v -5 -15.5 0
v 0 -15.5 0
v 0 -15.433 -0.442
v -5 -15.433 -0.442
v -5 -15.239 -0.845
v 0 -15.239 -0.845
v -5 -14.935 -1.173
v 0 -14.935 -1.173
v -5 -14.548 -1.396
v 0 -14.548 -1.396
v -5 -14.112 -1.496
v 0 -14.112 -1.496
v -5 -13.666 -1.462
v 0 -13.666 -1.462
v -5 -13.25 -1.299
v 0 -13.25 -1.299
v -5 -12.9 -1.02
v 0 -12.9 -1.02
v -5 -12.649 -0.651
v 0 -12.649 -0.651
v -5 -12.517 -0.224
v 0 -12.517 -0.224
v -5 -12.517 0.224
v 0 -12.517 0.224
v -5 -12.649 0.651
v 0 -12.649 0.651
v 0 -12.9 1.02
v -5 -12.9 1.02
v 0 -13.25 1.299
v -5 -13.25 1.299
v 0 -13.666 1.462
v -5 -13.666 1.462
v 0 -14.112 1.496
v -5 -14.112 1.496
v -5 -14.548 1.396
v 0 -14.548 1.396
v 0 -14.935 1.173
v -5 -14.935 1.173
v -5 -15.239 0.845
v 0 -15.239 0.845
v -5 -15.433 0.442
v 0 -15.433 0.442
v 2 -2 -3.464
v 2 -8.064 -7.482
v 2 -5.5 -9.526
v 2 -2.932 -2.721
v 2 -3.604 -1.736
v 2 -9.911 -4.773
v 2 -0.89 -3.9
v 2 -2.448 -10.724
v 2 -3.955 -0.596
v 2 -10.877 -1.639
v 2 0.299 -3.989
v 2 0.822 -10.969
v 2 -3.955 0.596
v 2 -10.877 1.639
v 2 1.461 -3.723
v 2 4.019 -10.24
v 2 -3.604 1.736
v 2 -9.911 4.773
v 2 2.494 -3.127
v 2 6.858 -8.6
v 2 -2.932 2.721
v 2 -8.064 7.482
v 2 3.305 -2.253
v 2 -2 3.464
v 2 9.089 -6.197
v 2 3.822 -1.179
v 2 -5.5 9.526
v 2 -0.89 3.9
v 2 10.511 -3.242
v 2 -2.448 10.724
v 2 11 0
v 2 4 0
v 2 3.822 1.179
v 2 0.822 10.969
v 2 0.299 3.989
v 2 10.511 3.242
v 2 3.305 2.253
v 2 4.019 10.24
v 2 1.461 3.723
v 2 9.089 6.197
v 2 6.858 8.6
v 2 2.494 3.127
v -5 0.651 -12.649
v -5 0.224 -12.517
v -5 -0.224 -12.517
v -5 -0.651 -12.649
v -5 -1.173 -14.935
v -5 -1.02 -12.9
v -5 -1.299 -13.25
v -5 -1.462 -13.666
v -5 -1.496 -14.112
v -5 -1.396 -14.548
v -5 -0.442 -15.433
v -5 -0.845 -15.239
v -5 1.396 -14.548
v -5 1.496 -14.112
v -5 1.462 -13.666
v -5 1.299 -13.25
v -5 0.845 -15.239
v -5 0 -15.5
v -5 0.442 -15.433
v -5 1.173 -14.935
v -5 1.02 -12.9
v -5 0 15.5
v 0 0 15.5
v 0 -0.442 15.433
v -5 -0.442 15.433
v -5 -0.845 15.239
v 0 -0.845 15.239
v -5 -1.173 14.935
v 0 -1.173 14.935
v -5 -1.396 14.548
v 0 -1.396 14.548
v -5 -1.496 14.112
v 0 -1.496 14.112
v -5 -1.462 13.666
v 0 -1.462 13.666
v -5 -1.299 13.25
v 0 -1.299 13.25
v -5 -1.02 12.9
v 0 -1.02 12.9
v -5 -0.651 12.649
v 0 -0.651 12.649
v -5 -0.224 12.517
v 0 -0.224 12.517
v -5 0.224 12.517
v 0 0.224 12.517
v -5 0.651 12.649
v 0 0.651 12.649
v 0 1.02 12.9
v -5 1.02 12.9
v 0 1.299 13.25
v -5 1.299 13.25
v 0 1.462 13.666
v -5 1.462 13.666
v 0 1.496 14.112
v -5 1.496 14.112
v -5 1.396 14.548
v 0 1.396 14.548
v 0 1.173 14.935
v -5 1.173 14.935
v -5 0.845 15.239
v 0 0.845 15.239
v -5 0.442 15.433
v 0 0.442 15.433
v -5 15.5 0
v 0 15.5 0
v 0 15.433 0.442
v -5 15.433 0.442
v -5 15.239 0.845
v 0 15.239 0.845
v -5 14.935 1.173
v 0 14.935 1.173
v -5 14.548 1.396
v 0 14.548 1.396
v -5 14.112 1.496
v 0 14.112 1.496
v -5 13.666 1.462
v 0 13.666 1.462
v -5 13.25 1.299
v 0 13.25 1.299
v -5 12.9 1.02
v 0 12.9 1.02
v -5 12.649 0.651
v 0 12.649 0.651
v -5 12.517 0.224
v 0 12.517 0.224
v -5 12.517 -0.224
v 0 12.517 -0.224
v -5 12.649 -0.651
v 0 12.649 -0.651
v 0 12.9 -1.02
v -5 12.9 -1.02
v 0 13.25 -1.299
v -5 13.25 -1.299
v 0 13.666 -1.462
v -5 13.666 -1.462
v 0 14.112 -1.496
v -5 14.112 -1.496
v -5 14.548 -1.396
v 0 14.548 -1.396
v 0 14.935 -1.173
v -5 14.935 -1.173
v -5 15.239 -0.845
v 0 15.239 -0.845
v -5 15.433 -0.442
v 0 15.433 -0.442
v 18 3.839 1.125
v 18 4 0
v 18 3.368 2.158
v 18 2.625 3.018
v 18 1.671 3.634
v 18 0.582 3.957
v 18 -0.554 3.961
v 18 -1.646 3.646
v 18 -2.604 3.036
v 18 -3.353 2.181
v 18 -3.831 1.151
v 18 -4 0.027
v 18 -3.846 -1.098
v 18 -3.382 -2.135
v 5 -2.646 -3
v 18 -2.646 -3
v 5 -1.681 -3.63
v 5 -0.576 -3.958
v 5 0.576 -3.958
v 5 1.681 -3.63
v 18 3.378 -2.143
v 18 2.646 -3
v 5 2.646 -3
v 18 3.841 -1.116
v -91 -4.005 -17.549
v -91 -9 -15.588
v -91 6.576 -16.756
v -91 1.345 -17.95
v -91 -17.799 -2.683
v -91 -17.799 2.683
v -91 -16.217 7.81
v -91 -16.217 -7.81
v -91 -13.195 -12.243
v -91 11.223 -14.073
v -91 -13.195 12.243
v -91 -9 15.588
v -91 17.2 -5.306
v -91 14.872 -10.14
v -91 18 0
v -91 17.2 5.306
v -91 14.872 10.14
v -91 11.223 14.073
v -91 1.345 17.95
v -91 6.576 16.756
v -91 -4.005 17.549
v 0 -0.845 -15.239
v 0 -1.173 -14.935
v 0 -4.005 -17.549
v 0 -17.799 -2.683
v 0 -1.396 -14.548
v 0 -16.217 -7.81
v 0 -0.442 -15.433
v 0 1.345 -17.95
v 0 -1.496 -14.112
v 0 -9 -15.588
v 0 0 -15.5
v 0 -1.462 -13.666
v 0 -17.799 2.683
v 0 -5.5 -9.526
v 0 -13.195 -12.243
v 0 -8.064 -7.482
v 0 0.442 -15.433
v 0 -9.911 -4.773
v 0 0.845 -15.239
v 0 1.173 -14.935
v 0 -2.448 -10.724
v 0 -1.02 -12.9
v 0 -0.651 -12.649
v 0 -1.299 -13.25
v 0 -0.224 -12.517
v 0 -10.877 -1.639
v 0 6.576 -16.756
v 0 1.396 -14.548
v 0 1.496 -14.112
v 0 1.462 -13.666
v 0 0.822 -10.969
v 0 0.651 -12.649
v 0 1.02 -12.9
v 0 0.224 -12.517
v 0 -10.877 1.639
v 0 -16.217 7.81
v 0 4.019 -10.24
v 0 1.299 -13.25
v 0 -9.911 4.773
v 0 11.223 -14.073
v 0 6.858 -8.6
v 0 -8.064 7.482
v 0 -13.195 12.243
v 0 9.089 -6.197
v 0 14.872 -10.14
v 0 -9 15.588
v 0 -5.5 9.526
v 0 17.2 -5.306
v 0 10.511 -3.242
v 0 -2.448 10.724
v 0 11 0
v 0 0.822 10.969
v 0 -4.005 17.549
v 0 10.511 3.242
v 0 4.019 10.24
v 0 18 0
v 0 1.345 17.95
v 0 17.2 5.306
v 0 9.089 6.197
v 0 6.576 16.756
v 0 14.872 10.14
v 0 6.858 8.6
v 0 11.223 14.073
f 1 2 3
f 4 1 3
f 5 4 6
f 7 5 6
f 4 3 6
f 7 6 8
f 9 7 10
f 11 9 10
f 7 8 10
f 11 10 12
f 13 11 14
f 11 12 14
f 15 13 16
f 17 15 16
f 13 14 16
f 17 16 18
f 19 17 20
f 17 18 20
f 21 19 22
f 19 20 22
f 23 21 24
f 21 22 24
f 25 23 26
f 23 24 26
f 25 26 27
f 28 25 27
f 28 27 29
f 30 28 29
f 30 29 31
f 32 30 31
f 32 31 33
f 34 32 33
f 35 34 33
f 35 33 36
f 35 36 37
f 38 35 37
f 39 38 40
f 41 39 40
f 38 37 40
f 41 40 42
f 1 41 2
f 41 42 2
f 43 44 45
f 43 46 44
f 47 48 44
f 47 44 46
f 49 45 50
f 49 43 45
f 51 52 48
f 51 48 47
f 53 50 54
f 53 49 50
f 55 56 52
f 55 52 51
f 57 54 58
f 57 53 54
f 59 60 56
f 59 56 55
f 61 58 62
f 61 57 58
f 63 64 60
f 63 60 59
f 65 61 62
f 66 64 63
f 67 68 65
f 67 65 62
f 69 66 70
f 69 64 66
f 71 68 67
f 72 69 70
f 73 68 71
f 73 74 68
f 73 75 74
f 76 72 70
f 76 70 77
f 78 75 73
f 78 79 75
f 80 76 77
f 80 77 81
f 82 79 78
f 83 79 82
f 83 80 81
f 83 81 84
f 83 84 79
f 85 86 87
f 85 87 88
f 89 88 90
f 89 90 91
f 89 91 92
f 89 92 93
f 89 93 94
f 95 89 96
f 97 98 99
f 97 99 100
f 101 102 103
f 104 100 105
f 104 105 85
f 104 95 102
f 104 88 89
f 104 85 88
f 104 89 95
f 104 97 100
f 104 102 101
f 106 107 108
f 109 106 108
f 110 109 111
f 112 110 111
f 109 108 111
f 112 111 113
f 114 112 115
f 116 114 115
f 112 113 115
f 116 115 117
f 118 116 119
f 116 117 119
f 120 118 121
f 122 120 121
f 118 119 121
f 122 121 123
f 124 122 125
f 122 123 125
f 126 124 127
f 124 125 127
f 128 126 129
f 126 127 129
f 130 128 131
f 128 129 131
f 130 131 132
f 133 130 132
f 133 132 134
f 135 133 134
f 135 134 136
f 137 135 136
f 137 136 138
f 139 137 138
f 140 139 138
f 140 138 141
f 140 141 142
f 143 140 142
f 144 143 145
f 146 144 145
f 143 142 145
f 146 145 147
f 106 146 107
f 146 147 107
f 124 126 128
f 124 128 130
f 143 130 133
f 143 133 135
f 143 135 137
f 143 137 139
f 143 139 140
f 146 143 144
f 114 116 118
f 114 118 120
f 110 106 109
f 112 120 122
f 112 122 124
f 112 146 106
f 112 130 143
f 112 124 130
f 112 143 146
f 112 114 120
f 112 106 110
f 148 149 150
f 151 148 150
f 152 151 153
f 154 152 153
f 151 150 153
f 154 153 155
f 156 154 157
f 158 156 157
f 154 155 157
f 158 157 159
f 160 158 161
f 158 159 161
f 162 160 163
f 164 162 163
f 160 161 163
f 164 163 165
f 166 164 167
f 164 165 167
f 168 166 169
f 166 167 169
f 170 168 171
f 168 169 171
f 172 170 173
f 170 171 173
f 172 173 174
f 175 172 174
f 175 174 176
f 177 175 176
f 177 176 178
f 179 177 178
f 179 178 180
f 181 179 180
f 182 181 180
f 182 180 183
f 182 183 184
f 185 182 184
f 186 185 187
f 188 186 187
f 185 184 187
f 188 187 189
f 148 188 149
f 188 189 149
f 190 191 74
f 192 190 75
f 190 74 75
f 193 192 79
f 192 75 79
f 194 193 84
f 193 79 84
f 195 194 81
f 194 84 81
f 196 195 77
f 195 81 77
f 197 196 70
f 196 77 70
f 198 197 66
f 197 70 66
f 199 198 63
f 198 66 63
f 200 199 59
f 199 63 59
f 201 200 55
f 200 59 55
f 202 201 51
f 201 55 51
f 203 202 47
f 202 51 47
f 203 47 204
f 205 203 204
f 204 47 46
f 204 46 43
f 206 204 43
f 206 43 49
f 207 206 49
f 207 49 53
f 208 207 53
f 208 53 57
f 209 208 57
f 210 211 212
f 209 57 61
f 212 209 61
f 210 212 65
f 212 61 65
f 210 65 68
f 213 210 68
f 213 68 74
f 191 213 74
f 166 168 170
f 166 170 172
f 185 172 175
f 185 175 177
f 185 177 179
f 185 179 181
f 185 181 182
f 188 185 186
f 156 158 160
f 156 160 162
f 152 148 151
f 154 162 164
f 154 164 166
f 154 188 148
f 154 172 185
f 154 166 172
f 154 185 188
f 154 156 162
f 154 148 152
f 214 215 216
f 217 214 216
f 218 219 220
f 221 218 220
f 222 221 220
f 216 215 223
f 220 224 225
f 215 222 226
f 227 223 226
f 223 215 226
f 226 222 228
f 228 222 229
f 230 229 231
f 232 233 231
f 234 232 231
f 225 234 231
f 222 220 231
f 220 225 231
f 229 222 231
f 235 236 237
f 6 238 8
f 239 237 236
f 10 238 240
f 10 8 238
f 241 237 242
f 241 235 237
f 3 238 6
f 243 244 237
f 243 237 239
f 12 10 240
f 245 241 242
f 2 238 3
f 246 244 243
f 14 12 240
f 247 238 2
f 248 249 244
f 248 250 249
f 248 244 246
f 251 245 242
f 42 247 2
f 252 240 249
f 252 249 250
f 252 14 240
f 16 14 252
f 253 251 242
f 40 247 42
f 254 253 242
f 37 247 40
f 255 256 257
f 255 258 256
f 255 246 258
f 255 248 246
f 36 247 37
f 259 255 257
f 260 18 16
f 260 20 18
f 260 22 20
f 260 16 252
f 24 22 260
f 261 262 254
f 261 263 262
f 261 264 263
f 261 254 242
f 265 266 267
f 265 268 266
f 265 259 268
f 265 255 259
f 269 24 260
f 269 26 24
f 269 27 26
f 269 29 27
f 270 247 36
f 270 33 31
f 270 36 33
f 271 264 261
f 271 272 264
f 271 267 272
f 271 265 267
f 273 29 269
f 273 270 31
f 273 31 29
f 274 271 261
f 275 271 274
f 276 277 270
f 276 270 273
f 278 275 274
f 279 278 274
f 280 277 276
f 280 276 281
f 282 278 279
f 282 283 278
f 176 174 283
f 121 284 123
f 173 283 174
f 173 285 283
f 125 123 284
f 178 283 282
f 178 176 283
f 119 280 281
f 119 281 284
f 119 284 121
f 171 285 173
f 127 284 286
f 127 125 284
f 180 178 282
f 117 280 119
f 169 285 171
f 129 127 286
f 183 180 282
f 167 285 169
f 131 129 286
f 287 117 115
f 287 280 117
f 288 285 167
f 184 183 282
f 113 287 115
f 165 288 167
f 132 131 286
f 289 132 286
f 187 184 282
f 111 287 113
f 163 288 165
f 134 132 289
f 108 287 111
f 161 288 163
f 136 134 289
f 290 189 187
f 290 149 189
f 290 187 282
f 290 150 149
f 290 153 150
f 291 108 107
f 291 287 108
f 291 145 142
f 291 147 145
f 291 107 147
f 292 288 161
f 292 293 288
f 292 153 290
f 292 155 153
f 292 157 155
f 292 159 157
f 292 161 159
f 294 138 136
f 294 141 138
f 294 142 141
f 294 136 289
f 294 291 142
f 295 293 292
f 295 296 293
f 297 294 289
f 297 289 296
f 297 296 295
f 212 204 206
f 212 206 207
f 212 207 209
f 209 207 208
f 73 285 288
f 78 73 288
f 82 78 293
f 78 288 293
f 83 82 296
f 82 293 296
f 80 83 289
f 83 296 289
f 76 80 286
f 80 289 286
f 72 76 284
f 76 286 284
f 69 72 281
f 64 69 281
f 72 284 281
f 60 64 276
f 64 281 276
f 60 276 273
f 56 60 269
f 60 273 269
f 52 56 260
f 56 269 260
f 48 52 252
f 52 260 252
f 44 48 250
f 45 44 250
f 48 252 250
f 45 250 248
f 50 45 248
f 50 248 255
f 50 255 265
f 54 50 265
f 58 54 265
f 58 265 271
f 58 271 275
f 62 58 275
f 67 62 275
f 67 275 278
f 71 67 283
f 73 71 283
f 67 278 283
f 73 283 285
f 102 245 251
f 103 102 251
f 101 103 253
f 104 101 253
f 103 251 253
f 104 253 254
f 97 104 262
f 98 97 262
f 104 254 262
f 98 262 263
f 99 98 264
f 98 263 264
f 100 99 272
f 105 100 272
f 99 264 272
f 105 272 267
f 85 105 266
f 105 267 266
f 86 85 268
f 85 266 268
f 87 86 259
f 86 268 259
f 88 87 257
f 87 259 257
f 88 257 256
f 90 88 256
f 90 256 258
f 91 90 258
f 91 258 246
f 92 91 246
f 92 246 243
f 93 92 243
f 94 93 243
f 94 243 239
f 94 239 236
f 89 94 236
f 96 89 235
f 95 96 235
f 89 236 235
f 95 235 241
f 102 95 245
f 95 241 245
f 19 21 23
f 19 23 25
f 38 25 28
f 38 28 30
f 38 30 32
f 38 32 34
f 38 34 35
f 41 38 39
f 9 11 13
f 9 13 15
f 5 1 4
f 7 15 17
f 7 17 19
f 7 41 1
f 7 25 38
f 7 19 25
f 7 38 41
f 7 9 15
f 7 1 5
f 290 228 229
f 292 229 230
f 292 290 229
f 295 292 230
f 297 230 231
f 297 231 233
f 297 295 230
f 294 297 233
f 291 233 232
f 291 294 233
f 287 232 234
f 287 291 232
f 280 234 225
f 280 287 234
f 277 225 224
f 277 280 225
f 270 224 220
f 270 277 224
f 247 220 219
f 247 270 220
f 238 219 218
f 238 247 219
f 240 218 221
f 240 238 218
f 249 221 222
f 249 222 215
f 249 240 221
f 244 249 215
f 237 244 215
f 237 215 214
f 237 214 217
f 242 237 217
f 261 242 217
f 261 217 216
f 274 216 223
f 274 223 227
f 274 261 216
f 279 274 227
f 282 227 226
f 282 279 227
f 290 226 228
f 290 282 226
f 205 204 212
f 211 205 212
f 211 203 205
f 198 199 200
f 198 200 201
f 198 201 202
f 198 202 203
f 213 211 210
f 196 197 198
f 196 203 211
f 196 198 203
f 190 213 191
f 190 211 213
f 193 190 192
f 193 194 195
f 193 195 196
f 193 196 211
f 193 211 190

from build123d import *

# Parameters (mm, degrees)
F0_R            = 18
F1_DEPTH        = 91
F2_R            = 11
F3_DEPTH        = 2
F4_R            = 4
F5_DEPTH        = 18
F6_R            = 1.5
F7_DEPTH        = 5
F7_COPIES_COUNT = 4
F9_START        = 5
F8_W            = 20
F8_H            = 10
F9_DEPTH        = 20


# Not quite as in the source:
# - a pattern or mirror of a feature is missing from the dataset's text; its kind, count and spacing are read off the source's solid


with BuildPart() as f1:
    # F0 (on Right) → F1 (new body)
    with BuildSketch(Plane.YZ):
        Circle(F0_R)
    extrude(amount=-F1_DEPTH)

    # F2 (on Right) → F3 (join)
    with BuildSketch(Plane.YZ):
        Circle(F2_R)
    extrude(amount=F3_DEPTH)

    # F4 (on Right) → F5 (join)
    with BuildSketch(Plane.YZ):
        Circle(F4_R)
    extrude(amount=F5_DEPTH)

    # F6 (on Right) → F7 (cut)
    with BuildSketch(Plane.YZ):
        with Locations((14, 0)):
            Circle(F6_R)
    f7 = extrude(amount=-F7_DEPTH, mode=Mode.SUBTRACT)

    # F7_copies: F7 ×4 about axis
    f7_copies_axis = Axis((0, 0, 0), (1, 0, 0))
    for i in range(1, F7_COPIES_COUNT):
        add(f7.rotate(f7_copies_axis, i * 360 / F7_COPIES_COUNT), mode=Mode.SUBTRACT)

    # F8 (on Right) → F9 (cut)
    with BuildSketch(Plane.YZ.offset(F9_START)):
        with Locations((0, -8)):
            Rectangle(F8_W, F8_H)
    extrude(amount=F9_DEPTH, mode=Mode.SUBTRACT)


solid = f1.part
